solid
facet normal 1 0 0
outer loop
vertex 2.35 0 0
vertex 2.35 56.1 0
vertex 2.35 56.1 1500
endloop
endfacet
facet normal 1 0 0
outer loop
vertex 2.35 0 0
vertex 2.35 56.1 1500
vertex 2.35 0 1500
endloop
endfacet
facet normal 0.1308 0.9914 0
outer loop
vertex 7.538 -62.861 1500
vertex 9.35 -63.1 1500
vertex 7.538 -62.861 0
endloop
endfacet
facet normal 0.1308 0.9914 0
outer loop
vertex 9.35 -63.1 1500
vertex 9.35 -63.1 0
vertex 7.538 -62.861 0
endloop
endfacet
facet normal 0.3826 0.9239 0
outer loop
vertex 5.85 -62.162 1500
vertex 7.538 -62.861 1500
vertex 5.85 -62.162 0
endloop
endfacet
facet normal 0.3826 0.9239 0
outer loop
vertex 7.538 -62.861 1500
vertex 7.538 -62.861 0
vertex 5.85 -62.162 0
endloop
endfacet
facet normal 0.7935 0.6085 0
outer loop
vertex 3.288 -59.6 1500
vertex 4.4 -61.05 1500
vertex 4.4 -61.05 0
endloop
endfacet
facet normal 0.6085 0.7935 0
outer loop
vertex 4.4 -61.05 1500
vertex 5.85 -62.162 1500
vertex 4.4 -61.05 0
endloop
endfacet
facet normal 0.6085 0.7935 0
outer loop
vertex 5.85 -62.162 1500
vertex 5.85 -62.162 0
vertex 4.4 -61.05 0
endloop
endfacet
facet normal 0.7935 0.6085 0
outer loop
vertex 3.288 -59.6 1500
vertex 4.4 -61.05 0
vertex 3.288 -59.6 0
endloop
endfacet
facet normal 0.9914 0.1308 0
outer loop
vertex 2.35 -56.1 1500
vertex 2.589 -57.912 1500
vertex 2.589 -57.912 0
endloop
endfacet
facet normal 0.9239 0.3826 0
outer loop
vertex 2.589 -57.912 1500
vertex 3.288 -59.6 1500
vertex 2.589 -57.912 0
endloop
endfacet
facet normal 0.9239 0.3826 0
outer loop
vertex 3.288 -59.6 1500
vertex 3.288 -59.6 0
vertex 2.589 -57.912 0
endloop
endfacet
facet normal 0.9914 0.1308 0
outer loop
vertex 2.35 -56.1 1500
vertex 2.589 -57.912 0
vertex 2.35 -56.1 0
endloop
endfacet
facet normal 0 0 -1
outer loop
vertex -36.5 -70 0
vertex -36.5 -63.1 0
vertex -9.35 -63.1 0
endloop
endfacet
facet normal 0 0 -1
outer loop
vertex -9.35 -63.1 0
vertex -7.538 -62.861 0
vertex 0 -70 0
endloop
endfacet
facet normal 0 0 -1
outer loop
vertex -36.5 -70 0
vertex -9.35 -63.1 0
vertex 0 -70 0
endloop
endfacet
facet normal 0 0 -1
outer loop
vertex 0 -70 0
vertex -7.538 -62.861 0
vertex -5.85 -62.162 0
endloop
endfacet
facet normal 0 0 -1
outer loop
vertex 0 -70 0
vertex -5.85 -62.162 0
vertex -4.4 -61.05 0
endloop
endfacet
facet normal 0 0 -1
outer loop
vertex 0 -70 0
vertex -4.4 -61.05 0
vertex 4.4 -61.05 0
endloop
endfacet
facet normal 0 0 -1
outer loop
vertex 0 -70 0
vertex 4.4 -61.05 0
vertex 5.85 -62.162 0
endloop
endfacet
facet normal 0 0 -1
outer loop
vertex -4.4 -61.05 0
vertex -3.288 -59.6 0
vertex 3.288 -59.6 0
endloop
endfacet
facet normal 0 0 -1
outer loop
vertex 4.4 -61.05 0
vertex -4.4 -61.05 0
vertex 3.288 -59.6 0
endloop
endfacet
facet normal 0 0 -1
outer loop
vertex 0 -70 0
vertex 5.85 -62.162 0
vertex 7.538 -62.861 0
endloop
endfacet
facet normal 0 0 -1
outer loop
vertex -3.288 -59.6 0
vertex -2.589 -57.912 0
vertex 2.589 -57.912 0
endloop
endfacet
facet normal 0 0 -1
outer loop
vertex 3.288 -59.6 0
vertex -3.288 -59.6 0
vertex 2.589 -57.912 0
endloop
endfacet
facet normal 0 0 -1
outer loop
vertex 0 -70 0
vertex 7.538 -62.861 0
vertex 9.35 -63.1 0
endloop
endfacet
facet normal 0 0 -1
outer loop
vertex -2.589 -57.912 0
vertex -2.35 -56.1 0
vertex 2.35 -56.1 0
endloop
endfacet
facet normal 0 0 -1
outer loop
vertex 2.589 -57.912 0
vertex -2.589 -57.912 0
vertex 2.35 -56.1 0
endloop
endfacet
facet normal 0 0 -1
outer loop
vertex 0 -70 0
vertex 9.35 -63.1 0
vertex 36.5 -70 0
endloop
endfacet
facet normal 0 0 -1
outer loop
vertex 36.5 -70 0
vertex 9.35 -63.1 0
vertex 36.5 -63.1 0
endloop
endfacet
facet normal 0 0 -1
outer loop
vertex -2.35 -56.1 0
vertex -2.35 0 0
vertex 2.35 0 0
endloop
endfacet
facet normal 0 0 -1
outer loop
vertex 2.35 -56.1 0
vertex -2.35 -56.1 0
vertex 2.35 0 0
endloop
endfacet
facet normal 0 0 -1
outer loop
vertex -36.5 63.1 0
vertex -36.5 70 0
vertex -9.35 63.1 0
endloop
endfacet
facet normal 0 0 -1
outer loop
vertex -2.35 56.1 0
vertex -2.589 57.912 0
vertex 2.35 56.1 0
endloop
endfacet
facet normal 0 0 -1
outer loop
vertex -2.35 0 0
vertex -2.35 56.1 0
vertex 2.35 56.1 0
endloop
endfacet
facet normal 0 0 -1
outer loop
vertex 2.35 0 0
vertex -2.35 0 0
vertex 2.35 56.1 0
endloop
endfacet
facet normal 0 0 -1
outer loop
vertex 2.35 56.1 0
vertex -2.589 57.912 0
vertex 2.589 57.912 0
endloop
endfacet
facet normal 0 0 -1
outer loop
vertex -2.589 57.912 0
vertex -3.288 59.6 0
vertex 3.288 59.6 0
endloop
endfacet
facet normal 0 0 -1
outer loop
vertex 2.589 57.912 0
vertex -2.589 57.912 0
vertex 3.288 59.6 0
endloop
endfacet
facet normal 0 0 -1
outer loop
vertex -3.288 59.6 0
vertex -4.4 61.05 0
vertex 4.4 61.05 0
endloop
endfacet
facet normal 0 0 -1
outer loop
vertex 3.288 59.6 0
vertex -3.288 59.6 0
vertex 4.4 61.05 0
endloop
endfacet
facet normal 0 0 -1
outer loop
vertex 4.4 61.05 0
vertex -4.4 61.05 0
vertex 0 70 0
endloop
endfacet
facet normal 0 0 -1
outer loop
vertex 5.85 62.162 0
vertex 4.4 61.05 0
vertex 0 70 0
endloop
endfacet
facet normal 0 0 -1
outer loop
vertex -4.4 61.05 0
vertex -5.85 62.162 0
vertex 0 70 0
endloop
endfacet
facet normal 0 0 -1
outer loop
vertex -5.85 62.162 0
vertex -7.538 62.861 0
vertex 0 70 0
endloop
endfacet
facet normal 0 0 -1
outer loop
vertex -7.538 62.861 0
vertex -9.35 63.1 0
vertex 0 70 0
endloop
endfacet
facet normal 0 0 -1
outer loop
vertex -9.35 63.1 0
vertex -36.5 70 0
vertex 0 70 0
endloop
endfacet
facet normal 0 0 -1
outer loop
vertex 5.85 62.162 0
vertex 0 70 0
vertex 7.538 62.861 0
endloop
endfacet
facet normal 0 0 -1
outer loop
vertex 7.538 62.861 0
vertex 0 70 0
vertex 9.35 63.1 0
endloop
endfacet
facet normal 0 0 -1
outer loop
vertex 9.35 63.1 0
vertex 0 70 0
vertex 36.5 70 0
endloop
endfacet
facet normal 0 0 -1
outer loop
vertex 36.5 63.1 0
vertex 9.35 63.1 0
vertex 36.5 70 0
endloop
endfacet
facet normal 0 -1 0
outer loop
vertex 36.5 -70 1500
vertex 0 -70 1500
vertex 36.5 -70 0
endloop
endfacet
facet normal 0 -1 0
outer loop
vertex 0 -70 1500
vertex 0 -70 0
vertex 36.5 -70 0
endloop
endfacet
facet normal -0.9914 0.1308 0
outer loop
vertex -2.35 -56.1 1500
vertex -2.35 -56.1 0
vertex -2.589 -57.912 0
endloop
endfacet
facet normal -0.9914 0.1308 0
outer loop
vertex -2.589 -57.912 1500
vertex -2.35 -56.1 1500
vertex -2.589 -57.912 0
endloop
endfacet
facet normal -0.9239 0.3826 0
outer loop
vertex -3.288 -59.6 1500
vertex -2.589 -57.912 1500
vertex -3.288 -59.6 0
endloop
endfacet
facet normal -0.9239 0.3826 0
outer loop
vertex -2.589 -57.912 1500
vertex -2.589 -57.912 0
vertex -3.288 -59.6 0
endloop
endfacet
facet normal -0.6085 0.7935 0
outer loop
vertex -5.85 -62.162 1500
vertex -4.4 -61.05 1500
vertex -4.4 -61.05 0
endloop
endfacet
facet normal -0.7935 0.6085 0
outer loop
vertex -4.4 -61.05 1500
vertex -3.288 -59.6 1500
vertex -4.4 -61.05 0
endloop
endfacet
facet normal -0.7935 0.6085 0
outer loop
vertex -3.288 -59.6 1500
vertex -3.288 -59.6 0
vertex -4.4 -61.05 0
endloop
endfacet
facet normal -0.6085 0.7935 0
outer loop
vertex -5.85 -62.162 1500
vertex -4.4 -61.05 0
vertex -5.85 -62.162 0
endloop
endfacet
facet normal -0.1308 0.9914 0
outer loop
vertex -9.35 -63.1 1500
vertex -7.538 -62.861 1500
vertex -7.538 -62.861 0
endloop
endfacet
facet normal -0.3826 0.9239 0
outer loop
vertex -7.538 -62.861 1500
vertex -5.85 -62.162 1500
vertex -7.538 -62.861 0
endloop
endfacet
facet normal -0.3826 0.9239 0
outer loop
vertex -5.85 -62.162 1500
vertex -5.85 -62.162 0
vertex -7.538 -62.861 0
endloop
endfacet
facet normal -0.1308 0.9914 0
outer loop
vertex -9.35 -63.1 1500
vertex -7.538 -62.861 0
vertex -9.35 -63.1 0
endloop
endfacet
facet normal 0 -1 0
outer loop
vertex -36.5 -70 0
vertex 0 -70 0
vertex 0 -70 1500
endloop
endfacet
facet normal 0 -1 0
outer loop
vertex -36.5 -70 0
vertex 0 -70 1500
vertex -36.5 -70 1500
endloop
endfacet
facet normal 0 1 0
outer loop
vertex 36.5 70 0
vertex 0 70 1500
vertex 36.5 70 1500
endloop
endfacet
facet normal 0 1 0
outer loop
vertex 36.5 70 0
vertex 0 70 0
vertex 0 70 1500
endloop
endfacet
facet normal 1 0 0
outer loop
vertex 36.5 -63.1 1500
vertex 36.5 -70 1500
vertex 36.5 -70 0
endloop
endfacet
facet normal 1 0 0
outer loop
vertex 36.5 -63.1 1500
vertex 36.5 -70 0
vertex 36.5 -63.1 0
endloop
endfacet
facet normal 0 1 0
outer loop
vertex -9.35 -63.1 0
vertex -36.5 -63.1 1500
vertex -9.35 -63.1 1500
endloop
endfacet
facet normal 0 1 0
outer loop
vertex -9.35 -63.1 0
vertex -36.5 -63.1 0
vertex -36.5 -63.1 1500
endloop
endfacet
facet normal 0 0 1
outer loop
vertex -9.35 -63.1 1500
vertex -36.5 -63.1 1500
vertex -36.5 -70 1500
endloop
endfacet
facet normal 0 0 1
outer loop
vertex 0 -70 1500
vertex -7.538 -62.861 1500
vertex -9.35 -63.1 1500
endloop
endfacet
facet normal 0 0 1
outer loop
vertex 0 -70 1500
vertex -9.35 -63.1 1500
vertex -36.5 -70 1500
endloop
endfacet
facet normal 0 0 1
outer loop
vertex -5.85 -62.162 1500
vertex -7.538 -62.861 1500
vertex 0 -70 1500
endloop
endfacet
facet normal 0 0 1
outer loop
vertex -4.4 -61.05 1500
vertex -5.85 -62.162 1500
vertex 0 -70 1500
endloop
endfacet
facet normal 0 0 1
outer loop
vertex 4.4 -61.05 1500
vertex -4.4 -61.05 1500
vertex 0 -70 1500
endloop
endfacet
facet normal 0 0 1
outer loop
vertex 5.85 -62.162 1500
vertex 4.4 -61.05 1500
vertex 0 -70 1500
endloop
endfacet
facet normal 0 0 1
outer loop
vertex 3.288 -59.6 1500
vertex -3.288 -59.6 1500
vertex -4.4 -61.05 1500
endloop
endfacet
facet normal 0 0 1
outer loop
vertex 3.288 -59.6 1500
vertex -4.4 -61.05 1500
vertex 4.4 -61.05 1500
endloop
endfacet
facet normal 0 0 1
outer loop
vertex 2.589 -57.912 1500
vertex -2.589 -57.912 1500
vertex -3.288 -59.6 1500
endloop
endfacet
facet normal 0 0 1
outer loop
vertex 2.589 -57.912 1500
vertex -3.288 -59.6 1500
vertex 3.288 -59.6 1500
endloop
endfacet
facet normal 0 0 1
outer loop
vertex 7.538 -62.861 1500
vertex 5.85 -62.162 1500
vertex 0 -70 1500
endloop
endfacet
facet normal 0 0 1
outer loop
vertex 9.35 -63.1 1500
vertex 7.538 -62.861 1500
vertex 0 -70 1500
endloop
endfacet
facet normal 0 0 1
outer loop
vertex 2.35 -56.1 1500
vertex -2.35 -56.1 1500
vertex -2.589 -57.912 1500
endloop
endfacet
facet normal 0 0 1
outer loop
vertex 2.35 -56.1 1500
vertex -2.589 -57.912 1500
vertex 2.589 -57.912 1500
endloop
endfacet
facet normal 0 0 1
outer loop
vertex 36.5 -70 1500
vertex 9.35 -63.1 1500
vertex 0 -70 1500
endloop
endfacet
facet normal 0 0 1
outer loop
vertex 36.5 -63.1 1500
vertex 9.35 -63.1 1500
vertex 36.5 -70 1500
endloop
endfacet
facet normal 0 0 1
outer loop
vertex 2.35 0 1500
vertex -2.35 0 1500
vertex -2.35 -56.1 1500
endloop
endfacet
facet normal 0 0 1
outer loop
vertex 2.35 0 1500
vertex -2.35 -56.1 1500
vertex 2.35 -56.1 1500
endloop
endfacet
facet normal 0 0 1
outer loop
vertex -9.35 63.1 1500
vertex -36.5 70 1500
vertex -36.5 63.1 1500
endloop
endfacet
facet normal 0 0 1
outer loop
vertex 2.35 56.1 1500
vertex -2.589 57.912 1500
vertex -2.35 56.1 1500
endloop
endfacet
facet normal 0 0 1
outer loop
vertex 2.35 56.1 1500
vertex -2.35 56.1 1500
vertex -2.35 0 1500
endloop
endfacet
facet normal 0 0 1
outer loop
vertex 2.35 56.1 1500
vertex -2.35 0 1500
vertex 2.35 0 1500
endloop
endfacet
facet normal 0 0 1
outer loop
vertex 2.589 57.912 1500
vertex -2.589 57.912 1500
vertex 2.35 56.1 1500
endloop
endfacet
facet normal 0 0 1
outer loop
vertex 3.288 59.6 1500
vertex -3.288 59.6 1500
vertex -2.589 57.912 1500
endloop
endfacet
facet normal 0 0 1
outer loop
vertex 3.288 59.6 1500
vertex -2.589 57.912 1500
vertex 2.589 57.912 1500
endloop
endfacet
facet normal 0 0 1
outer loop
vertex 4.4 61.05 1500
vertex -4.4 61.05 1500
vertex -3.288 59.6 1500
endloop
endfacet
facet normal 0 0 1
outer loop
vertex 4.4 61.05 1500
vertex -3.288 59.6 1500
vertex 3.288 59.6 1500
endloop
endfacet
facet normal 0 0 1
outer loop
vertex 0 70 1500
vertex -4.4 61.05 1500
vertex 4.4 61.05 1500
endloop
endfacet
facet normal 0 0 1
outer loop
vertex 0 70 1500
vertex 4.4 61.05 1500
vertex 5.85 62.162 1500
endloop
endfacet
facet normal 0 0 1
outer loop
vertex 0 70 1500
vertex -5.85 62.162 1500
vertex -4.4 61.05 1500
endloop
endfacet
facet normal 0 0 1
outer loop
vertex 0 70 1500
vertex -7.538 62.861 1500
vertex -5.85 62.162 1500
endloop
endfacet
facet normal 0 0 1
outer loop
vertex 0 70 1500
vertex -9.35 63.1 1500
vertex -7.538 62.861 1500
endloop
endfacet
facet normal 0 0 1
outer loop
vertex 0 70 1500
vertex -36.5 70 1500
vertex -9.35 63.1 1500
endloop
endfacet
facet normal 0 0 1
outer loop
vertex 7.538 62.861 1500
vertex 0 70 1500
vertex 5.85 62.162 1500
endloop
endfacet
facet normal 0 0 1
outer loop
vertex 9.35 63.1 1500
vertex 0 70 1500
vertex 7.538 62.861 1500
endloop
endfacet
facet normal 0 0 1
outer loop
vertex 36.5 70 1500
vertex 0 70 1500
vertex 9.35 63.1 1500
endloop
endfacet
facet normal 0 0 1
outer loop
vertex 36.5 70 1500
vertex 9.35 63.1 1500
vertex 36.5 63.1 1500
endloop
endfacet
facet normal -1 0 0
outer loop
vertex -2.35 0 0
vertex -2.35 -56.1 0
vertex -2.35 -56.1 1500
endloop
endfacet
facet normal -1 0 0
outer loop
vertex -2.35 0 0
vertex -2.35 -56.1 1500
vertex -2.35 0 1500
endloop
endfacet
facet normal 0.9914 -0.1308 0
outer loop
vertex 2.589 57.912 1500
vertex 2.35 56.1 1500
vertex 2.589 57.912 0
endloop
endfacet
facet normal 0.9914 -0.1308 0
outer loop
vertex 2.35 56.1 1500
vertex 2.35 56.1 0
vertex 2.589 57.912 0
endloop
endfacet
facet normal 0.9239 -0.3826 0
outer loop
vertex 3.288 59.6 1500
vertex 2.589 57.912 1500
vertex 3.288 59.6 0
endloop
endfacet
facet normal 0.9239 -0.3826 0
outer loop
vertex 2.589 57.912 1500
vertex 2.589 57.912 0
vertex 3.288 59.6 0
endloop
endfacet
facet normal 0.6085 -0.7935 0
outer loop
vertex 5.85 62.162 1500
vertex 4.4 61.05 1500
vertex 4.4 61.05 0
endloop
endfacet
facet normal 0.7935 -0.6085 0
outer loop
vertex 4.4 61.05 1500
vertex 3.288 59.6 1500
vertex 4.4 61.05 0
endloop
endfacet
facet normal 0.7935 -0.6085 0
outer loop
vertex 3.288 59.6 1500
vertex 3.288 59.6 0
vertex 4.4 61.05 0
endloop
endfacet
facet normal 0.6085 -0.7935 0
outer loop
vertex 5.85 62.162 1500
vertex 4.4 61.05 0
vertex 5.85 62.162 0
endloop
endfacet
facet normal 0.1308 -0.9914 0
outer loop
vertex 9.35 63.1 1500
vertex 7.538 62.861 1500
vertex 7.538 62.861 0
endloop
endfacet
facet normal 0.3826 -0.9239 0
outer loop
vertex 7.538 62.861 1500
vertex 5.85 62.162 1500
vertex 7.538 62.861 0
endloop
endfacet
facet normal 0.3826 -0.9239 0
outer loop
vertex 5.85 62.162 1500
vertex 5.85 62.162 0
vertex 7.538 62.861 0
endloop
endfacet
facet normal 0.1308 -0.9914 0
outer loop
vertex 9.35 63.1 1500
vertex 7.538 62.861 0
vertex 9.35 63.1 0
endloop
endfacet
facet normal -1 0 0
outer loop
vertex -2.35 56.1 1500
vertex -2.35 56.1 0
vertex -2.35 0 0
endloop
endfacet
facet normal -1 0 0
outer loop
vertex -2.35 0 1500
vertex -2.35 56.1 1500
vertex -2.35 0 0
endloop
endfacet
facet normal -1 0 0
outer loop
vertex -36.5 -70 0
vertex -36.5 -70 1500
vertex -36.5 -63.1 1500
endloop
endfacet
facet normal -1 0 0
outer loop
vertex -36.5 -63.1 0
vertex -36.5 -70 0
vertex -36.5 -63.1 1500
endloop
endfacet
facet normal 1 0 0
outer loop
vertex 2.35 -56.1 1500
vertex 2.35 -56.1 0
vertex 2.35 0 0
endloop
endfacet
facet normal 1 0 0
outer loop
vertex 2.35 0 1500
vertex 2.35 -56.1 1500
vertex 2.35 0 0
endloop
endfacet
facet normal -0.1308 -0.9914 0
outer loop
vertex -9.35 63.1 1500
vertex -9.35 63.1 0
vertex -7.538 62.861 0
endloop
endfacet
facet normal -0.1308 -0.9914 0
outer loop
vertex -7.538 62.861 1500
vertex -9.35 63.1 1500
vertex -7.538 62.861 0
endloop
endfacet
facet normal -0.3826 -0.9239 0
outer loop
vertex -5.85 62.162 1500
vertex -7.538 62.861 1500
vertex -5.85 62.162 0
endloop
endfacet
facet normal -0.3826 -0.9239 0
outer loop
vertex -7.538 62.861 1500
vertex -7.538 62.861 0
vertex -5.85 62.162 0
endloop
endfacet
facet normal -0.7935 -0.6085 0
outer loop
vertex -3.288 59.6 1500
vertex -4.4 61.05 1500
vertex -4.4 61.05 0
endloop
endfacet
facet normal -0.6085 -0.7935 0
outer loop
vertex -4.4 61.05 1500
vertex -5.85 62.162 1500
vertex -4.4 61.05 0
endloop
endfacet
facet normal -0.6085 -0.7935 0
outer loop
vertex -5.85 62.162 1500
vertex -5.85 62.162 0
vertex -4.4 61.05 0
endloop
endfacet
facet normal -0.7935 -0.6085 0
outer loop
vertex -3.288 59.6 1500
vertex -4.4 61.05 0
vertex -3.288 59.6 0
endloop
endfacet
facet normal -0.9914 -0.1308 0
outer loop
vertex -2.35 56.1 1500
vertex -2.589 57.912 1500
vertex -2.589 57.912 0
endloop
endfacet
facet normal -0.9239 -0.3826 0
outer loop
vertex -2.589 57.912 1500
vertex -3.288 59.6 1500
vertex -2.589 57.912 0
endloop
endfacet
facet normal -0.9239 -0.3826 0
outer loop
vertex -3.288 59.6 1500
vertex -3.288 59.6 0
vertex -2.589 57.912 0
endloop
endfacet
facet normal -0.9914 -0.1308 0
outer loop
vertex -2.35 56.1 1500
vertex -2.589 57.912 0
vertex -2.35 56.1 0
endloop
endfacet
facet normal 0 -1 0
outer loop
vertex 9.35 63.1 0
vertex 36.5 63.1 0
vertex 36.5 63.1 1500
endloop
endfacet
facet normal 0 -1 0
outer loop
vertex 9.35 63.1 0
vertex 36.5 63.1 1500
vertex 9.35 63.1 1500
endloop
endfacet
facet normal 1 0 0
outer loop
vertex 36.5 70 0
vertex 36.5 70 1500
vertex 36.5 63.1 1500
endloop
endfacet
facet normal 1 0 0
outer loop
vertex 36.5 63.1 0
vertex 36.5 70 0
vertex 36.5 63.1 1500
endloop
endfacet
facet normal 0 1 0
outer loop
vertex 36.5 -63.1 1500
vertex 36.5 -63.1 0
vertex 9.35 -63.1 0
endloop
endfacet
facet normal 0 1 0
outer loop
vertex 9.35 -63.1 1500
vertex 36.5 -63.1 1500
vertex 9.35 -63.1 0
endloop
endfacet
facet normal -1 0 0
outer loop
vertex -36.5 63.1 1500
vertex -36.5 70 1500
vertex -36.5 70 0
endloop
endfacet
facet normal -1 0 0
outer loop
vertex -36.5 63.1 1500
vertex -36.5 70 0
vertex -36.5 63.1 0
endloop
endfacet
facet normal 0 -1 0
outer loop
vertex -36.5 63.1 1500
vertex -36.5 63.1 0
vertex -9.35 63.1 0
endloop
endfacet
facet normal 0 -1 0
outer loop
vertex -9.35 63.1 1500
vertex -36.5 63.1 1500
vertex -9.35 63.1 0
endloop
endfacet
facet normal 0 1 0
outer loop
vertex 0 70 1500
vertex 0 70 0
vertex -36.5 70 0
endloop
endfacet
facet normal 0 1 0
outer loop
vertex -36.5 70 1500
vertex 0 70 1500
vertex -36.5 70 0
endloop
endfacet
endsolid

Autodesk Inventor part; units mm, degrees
ref_plane "YZ Plane" through (0, 0, 0) normal (1, 0, 0) x (0, 1, 0)
ref_plane "Start plane" through (0, 0, 0) normal (0, 0, 1) x (1, 0, 0)
ref_plane "End plane" through (0, 0, 1500) normal (0, 0, 1) x (1, 0, 0)
sketch "Sketch" plane through (0, 0, 0) normal (0, 0, 1) x (1, 0, 0)
  line L0 (-36.5, -70) -> (-36.5, -63.1)
  line L1 (-36.5, -63.1) -> (-9.35, -63.1)
  line L2 (-2.35, -56.1) -> (-2.35, 0)
  line L3 (-2.35, 0) -> (0, 0) construction
  line L4 (0, 0) -> (0, -70) construction
  line L5 (0, -70) -> (-36.5, -70)
  line L6 (-60, 0) -> (80, 0) construction
  line L7 (0, -60) -> (0, 80) construction
  line L8 (36.5, -70) -> (36.5, -63.1)
  line L9 (36.5, -63.1) -> (9.35, -63.1)
  line L10 (2.35, -56.1) -> (2.35, 0)
  line L11 (2.35, 0) -> (0, 0) construction
  line L12 (0, -70) -> (36.5, -70)
  line L13 (-36.5, 70) -> (-36.5, 63.1)
  line L14 (-36.5, 63.1) -> (-9.35, 63.1)
  line L15 (-2.35, 56.1) -> (-2.35, 0)
  line L16 (0, 70) -> (-36.5, 70)
  line L17 (36.5, 70) -> (36.5, 63.1)
  line L18 (36.5, 63.1) -> (9.35, 63.1)
  line L19 (0, 70) -> (36.5, 70)
  line L20 (2.35, 56.1) -> (2.35, 0)
  arc A0 (-2.35, 56.1) -> (-9.35, 63.1) centre (-9.35, 56.1) ccw
  arc A1 (9.35, 63.1) -> (2.35, 56.1) centre (9.35, 56.1) ccw
  arc A2 (2.35, -56.1) -> (9.35, -63.1) centre (9.35, -56.1) ccw
  arc A3 (-9.35, -63.1) -> (-2.35, -56.1) centre (-9.35, -56.1) ccw
  line L21 (0, 108) -> (0, -88) construction
  line L22 (-88, 0) -> (108, 0) construction
  point P0 (-2.35, -63.1)
  point P1 (2.35, -63.1)
  point P2 (-2.35, 63.1)
  point P3 (2.35, 63.1)
  dimension "d1" = 70
  dimension "d2" = 6.9
  dimension "d3" = 36.5
  dimension "d4" = 2.35
  dimension "d10" = 7
extrude "Body" add sketch "Sketch" along normal up to surface (1500 mm away) from surface at 0
sketch "Sketch4" plane through (0, 0, 0) normal (0, 0, 1) x (1, 0, 0)
  line L0 (0, 0) -> (10, 0)
ref_plane "Work Plane3" through (0, 0, 0) normal (0, -1, 0) x (1, 0, 0)
sketch "Sketch5" plane through (0, 0, 0) normal (0, -1, 0) x (1, 0, 0)
  line L0 (-2, 0) -> (12, 0)
  line L1 (-2, 1500) -> (12, 1500)
  dimension "d14" = 1500
equation "\"d1\" = 0.5 * G_H"
equation "\"d2\" = G_T1"
equation "\"d3\" = 0.5 * G_W"
equation "\"d4\" = 0.5 * G_T"
equation "\"d10\" = G_IR"
equation "\"d5\" = G_L"
equation "\"G_W\" = 73"
equation "\"G_T\" = 4.7"
equation "\"G_T1\" = 6.9"
equation "\"G_IR\" = 7"
equation "\"G_L\" = d14"
equation "\"G_OFFSET_START\" = 0"
equation "\"G_OFFSET_END\" = 0"
equation "\"G_H\" = 140"
properties part number "PN-91/H-93419 - IPE140 - 1500" material "Steel, Mild"
